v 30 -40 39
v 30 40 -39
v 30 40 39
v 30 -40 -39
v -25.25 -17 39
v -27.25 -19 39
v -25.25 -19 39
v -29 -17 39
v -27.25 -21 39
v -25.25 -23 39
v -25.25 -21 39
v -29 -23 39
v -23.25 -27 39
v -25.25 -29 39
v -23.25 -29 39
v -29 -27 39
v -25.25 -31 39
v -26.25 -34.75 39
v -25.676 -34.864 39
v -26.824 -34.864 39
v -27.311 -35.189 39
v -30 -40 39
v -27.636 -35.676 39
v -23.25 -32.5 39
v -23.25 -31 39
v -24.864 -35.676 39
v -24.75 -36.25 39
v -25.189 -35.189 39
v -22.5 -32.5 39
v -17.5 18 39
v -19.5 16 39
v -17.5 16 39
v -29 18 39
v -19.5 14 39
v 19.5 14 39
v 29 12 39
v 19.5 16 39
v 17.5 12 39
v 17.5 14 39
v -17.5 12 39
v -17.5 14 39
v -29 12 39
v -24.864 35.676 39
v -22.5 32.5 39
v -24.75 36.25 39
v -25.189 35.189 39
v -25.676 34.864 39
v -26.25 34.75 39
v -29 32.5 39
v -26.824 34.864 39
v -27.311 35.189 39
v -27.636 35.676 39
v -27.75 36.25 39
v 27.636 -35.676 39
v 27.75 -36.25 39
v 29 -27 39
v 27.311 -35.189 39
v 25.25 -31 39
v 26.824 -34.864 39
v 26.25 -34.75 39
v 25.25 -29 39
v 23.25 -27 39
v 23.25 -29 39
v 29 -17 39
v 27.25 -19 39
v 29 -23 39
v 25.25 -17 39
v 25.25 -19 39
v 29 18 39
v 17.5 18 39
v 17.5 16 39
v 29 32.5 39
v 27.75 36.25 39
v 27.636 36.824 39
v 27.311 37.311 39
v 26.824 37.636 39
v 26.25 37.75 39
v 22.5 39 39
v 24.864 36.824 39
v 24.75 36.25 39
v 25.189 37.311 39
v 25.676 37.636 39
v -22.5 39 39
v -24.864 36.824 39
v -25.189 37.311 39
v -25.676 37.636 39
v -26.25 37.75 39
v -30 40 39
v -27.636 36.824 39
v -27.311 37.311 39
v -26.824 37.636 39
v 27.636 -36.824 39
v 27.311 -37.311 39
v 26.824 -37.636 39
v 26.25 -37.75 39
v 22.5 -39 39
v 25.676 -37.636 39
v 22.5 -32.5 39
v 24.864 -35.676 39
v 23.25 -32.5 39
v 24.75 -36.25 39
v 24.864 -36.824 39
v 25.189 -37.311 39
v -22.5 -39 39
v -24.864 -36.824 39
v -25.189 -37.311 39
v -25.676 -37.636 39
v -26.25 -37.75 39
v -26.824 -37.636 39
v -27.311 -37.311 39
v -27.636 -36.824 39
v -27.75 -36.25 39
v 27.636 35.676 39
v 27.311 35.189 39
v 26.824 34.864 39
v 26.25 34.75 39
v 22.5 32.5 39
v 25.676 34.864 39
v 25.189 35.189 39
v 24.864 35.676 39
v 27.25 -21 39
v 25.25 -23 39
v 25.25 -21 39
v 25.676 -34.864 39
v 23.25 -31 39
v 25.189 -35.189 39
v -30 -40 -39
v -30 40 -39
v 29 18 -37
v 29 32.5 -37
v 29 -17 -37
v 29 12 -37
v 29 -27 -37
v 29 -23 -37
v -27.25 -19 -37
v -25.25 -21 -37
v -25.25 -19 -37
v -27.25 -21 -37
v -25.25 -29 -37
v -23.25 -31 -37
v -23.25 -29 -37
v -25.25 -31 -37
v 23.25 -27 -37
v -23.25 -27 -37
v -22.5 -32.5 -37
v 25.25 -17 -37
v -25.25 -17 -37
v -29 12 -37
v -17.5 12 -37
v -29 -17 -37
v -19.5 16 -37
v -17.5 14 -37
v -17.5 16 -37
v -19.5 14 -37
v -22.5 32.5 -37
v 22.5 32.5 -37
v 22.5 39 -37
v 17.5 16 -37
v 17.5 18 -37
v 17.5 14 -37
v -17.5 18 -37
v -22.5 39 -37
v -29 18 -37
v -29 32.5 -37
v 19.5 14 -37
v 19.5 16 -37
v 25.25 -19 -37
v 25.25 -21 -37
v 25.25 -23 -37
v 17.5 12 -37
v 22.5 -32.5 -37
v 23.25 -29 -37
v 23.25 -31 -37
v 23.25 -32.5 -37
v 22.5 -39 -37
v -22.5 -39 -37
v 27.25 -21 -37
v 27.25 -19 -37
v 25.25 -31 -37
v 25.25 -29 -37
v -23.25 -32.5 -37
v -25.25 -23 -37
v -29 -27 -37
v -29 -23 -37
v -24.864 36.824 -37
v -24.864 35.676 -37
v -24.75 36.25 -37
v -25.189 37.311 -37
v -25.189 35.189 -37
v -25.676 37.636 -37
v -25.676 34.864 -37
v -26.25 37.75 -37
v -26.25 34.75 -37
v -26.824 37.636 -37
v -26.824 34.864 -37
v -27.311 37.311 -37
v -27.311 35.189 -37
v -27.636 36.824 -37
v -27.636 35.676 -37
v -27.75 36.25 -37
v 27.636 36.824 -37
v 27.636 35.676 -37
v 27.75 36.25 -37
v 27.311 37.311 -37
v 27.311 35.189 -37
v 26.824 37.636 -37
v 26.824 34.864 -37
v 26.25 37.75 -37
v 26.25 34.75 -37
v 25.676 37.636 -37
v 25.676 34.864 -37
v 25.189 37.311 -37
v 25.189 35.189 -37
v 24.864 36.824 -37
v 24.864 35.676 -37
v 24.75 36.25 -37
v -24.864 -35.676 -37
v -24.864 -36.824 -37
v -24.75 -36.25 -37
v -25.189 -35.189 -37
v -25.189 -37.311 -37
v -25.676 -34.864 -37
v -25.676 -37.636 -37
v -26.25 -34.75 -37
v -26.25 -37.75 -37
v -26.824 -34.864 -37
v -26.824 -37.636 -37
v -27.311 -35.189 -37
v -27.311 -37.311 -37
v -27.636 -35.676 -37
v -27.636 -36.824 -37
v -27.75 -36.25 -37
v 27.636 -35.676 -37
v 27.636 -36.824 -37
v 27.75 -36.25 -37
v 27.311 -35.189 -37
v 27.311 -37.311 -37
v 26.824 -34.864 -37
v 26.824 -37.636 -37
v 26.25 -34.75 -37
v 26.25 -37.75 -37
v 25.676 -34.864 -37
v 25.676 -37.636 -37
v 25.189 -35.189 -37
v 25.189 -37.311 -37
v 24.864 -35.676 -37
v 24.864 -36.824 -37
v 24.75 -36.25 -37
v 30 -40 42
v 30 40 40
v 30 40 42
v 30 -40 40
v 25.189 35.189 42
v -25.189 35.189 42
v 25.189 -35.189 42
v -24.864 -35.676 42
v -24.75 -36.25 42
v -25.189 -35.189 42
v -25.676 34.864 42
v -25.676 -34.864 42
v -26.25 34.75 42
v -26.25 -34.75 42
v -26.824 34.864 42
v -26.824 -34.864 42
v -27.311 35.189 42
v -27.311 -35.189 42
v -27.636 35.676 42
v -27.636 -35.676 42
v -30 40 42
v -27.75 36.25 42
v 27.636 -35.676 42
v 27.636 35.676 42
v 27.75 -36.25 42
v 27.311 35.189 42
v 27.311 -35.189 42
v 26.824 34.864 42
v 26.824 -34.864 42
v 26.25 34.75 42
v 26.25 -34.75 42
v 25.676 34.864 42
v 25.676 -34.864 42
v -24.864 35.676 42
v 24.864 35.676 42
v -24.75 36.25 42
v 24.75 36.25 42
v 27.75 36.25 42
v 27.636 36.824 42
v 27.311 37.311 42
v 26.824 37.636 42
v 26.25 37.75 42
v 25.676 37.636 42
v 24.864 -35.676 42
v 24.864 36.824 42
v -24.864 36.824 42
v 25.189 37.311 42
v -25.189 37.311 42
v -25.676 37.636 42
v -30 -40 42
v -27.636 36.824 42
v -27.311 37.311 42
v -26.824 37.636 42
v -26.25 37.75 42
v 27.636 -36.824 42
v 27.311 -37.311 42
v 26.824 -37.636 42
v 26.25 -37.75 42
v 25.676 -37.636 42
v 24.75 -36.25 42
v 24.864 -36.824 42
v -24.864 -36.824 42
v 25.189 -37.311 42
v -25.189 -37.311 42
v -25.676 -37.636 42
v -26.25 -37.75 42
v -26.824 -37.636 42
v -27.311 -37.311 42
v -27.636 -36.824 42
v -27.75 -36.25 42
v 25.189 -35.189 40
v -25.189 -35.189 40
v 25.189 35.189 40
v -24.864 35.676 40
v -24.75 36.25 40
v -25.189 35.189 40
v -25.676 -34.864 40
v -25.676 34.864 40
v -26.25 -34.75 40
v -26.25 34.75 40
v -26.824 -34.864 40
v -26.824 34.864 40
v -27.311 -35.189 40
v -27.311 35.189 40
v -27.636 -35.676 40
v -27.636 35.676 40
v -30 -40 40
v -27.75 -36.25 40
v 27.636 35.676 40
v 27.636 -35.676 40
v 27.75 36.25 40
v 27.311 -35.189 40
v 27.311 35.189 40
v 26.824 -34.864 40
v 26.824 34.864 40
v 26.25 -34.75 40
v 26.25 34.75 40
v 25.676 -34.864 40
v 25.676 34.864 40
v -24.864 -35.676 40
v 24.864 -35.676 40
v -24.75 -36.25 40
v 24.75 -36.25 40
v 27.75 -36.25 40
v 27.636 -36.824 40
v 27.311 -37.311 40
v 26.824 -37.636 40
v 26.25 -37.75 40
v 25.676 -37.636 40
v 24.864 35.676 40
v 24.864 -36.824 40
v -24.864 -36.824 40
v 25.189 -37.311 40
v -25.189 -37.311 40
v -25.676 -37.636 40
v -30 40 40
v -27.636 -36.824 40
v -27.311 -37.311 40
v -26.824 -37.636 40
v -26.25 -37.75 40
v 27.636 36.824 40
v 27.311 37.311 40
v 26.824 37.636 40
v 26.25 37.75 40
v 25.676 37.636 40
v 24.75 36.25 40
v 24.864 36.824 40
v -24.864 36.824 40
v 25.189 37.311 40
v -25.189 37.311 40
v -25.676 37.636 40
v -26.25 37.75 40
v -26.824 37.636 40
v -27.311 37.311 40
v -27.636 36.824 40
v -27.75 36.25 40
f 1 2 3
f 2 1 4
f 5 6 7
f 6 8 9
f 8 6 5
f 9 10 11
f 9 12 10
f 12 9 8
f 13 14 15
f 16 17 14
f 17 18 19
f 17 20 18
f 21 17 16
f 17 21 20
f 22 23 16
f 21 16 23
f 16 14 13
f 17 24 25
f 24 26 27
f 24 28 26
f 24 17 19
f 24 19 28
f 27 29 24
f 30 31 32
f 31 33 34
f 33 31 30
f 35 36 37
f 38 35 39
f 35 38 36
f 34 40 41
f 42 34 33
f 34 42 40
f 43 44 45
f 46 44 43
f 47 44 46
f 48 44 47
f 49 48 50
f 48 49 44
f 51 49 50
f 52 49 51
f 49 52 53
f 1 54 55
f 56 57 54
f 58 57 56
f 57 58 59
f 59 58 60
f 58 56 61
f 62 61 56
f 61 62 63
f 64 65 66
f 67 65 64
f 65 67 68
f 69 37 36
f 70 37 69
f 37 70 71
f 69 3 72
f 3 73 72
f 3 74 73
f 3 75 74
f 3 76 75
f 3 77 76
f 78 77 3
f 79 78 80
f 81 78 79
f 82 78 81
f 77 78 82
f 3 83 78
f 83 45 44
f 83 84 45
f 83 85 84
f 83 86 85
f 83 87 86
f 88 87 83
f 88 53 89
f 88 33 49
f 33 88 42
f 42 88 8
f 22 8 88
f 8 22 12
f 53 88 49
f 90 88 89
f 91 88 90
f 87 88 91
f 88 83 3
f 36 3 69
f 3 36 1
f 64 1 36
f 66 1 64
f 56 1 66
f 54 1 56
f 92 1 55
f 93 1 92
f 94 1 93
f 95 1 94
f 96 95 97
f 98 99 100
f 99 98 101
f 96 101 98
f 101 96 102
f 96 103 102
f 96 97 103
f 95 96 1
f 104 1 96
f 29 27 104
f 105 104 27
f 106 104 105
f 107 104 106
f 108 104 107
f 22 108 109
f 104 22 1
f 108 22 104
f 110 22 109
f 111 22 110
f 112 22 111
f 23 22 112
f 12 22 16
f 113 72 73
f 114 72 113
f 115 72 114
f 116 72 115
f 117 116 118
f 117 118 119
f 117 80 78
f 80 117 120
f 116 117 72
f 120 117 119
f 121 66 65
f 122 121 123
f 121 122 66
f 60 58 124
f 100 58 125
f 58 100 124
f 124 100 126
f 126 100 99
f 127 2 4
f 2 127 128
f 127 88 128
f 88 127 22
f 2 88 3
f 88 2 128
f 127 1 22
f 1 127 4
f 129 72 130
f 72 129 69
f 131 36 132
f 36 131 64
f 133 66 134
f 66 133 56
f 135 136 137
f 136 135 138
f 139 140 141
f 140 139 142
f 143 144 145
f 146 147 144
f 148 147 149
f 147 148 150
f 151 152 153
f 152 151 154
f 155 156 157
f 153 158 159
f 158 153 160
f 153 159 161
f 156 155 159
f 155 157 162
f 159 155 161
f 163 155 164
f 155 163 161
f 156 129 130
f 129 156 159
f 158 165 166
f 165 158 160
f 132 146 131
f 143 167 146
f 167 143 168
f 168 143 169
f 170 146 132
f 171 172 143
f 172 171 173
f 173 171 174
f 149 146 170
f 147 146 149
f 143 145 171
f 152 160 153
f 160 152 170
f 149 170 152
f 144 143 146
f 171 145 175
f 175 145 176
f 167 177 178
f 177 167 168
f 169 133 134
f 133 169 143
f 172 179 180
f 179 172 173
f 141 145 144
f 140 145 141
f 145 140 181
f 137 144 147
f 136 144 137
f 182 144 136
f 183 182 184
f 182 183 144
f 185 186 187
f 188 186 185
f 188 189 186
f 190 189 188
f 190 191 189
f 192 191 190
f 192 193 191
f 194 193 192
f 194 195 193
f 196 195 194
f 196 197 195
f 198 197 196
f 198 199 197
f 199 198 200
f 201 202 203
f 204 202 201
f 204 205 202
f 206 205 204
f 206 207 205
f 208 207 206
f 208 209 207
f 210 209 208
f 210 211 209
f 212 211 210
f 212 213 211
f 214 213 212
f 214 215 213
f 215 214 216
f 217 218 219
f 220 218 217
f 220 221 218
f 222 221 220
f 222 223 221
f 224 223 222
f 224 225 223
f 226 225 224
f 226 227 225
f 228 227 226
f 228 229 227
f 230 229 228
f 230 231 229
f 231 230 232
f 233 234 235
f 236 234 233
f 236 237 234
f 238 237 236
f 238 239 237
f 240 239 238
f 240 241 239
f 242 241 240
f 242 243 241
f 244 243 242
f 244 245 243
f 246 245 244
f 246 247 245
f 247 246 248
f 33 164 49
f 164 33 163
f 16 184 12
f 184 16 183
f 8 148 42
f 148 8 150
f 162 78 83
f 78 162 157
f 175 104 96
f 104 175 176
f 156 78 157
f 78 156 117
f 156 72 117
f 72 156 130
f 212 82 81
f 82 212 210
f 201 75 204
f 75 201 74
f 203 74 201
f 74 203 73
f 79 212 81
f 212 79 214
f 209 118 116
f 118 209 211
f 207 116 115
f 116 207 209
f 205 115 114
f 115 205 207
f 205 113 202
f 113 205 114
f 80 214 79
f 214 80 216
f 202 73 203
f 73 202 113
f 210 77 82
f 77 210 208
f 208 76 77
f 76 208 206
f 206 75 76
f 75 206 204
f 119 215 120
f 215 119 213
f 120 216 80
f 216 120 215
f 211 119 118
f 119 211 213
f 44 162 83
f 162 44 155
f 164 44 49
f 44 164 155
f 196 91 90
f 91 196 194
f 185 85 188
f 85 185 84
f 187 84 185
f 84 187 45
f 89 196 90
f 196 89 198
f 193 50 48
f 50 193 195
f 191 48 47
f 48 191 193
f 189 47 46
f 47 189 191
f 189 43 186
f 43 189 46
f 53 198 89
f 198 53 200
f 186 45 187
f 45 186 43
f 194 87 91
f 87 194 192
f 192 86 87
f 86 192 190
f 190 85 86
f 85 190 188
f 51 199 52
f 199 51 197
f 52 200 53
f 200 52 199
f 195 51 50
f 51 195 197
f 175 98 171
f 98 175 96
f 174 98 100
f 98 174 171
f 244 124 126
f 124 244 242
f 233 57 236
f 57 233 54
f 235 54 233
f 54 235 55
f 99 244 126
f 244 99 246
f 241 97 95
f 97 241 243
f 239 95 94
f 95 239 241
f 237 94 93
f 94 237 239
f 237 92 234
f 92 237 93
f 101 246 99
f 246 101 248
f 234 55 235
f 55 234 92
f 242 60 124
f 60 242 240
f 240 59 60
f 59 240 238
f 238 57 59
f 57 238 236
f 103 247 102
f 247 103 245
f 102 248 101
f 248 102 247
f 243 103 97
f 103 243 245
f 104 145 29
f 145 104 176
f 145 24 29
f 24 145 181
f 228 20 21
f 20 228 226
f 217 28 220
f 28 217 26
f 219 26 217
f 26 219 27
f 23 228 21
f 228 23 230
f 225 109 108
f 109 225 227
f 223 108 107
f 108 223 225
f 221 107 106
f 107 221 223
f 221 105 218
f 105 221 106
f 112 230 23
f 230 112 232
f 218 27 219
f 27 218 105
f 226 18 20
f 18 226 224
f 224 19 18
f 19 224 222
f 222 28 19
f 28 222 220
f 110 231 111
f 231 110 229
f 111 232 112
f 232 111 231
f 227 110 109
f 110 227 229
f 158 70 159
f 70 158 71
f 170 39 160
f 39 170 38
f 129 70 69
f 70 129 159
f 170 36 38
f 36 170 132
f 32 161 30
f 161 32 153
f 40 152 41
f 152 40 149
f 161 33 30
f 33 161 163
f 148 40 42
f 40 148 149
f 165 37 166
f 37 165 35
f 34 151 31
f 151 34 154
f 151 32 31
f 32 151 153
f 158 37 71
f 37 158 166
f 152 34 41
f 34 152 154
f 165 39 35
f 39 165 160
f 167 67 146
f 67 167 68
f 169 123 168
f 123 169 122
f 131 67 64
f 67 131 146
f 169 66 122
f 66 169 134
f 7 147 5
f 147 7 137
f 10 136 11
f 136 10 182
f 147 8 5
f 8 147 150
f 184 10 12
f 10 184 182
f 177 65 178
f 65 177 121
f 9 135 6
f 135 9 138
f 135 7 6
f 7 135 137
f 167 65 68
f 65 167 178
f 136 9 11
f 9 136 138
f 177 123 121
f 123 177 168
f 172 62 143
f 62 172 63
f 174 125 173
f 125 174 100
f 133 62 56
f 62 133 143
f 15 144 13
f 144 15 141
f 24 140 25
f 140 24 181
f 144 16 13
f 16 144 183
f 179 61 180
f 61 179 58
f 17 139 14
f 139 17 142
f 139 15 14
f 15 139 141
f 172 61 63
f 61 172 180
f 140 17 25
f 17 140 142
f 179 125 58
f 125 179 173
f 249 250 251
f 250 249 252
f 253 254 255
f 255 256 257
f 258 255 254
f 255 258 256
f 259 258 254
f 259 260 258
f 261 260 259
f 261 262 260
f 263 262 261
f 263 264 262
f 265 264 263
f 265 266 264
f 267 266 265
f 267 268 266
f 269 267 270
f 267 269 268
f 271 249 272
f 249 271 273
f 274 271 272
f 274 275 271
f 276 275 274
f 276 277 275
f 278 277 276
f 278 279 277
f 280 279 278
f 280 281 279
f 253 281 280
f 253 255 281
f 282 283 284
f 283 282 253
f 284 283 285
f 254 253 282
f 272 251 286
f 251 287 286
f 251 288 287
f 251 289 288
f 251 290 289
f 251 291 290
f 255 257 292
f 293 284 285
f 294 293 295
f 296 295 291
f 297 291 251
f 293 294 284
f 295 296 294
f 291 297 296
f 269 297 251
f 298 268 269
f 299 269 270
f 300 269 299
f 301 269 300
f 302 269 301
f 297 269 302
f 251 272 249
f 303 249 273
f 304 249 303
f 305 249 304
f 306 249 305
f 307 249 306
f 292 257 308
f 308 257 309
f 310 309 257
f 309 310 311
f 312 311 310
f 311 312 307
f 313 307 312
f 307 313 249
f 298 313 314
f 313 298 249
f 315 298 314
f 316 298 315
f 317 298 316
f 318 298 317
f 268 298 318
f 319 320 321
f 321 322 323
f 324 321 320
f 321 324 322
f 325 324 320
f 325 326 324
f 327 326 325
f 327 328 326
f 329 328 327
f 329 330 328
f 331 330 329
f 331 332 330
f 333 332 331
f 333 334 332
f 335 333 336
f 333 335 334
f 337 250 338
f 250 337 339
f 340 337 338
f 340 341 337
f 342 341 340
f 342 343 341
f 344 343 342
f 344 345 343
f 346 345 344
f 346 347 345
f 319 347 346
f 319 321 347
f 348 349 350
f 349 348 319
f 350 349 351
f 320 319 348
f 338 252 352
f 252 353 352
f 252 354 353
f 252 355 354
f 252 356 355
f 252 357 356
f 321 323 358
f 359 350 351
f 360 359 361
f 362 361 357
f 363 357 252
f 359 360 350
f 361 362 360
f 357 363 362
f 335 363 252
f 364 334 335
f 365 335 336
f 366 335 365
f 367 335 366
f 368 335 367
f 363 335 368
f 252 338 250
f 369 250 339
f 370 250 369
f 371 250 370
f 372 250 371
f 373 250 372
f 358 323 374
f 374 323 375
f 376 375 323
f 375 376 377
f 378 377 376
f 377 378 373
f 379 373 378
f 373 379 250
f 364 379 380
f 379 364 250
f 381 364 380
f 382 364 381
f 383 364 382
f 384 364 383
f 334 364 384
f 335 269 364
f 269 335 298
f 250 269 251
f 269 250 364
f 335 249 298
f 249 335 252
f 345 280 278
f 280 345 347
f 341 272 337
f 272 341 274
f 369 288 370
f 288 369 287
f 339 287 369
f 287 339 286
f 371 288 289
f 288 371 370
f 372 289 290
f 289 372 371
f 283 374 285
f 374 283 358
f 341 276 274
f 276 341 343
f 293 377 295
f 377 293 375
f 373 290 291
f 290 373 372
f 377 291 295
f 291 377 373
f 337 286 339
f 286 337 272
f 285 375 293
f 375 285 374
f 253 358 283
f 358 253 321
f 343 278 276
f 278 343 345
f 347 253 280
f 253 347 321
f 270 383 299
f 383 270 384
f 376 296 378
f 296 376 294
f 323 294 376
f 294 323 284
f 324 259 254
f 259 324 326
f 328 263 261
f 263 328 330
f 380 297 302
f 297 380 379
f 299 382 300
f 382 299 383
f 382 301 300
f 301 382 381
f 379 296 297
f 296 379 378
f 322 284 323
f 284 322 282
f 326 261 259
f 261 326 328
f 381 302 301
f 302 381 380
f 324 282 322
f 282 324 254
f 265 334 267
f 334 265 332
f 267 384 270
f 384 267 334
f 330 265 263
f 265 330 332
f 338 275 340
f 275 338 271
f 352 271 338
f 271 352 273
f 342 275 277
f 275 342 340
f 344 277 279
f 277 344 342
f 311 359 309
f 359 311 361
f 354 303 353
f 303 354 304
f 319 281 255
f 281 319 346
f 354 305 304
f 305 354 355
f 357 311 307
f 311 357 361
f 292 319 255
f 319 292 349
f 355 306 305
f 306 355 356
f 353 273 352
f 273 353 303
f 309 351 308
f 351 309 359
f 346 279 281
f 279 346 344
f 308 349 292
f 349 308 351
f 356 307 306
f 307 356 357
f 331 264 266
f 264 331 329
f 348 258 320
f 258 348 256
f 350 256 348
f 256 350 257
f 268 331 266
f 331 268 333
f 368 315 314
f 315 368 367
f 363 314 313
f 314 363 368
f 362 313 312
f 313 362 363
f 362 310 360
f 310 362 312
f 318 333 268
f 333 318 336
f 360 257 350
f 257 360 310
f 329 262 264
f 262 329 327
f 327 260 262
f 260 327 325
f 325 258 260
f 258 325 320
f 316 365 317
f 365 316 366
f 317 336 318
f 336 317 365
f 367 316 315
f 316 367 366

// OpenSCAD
$fn=16;

height = 78;
length = 80;
width = 60;
holeDiameter = 3;
thickness = 2;


box();

// Shelves (add as many as you need)
translate([0, 15, 0]) shelf(39, 2);
translate([0, -20, 0]) shelf(54.5, 2);
translate([0, -30, 0]) shelf(50.5, 2);
    

translate([0, 0, height/2 + thickness]) lid();

/* Example lid
translate([0, 0, height/2 + thickness]) difference() {
    lid();
    translate([-10, 25, 0]) cylinder(d = 8.5, h = thickness, center = true);
    translate([10, 25, 0]) cylinder(d = 8.5, h = thickness, center = true);
    translate([-10, -13.5, 0]) cube(size = [11, 10.5, thickness], center = true);
    translate([-10, -27, 0]) cube(size = [10, 4, thickness], center = true);   
}
*/

module shelf(w, h) {
    side = (width - w)/2 + 2;
    difference() {
        union() {
            translate([(width - side) / 2, 0, 0]) cube(size = [side, 6, height], center = true);
            translate([-(width - side) / 2, 0, 0]) cube(size = [side, 6, height], center = true);
        }
        cube(size = [w, h, height], center = true);
    }
}

module hole(x) {
    x = holeDiameter * 2.5;
    union() {
        difference() {
            cube(size = [x, x, height], center = true);
            cylinder(d = holeDiameter, h = height, center = true);
        }
    }
}

module box() {
    // box
    difference() {
        cube(size = [width, length, height], center = true);
        translate([0, 0, thickness]) cube(size = [width - thickness, length - thickness, height], center = true);
    }
    
    // Holes
    x = holeDiameter * 2.5;
    translate([(width - x)/2, (length - x)/2, 0]) hole();
    translate([-(width - x)/2, (length - x)/2, 0]) hole();
    translate([(width - x)/2, -(length - x)/2, 0]) hole();
    translate([-(width - x)/2, -(length - x)/2, 0]) hole();
}

module lid() {
    difference() {
    cube(size = [width, length, thickness], center = true);
    x = holeDiameter * 2.5;
    translate([(width - x)/2, (length - x)/2, 0]) cylinder(d = holeDiameter, h = height, center = true);
    translate([-(width - x)/2, (length - x)/2, 0]) cylinder(d = holeDiameter, h = height, center = true);
    translate([(width - x)/2, -(length - x)/2, 0]) cylinder(d = holeDiameter, h = height, center = true);
    translate([-(width - x)/2, -(length - x)/2, 0]) cylinder(d = holeDiameter, h = height, center = true);
    }
}
